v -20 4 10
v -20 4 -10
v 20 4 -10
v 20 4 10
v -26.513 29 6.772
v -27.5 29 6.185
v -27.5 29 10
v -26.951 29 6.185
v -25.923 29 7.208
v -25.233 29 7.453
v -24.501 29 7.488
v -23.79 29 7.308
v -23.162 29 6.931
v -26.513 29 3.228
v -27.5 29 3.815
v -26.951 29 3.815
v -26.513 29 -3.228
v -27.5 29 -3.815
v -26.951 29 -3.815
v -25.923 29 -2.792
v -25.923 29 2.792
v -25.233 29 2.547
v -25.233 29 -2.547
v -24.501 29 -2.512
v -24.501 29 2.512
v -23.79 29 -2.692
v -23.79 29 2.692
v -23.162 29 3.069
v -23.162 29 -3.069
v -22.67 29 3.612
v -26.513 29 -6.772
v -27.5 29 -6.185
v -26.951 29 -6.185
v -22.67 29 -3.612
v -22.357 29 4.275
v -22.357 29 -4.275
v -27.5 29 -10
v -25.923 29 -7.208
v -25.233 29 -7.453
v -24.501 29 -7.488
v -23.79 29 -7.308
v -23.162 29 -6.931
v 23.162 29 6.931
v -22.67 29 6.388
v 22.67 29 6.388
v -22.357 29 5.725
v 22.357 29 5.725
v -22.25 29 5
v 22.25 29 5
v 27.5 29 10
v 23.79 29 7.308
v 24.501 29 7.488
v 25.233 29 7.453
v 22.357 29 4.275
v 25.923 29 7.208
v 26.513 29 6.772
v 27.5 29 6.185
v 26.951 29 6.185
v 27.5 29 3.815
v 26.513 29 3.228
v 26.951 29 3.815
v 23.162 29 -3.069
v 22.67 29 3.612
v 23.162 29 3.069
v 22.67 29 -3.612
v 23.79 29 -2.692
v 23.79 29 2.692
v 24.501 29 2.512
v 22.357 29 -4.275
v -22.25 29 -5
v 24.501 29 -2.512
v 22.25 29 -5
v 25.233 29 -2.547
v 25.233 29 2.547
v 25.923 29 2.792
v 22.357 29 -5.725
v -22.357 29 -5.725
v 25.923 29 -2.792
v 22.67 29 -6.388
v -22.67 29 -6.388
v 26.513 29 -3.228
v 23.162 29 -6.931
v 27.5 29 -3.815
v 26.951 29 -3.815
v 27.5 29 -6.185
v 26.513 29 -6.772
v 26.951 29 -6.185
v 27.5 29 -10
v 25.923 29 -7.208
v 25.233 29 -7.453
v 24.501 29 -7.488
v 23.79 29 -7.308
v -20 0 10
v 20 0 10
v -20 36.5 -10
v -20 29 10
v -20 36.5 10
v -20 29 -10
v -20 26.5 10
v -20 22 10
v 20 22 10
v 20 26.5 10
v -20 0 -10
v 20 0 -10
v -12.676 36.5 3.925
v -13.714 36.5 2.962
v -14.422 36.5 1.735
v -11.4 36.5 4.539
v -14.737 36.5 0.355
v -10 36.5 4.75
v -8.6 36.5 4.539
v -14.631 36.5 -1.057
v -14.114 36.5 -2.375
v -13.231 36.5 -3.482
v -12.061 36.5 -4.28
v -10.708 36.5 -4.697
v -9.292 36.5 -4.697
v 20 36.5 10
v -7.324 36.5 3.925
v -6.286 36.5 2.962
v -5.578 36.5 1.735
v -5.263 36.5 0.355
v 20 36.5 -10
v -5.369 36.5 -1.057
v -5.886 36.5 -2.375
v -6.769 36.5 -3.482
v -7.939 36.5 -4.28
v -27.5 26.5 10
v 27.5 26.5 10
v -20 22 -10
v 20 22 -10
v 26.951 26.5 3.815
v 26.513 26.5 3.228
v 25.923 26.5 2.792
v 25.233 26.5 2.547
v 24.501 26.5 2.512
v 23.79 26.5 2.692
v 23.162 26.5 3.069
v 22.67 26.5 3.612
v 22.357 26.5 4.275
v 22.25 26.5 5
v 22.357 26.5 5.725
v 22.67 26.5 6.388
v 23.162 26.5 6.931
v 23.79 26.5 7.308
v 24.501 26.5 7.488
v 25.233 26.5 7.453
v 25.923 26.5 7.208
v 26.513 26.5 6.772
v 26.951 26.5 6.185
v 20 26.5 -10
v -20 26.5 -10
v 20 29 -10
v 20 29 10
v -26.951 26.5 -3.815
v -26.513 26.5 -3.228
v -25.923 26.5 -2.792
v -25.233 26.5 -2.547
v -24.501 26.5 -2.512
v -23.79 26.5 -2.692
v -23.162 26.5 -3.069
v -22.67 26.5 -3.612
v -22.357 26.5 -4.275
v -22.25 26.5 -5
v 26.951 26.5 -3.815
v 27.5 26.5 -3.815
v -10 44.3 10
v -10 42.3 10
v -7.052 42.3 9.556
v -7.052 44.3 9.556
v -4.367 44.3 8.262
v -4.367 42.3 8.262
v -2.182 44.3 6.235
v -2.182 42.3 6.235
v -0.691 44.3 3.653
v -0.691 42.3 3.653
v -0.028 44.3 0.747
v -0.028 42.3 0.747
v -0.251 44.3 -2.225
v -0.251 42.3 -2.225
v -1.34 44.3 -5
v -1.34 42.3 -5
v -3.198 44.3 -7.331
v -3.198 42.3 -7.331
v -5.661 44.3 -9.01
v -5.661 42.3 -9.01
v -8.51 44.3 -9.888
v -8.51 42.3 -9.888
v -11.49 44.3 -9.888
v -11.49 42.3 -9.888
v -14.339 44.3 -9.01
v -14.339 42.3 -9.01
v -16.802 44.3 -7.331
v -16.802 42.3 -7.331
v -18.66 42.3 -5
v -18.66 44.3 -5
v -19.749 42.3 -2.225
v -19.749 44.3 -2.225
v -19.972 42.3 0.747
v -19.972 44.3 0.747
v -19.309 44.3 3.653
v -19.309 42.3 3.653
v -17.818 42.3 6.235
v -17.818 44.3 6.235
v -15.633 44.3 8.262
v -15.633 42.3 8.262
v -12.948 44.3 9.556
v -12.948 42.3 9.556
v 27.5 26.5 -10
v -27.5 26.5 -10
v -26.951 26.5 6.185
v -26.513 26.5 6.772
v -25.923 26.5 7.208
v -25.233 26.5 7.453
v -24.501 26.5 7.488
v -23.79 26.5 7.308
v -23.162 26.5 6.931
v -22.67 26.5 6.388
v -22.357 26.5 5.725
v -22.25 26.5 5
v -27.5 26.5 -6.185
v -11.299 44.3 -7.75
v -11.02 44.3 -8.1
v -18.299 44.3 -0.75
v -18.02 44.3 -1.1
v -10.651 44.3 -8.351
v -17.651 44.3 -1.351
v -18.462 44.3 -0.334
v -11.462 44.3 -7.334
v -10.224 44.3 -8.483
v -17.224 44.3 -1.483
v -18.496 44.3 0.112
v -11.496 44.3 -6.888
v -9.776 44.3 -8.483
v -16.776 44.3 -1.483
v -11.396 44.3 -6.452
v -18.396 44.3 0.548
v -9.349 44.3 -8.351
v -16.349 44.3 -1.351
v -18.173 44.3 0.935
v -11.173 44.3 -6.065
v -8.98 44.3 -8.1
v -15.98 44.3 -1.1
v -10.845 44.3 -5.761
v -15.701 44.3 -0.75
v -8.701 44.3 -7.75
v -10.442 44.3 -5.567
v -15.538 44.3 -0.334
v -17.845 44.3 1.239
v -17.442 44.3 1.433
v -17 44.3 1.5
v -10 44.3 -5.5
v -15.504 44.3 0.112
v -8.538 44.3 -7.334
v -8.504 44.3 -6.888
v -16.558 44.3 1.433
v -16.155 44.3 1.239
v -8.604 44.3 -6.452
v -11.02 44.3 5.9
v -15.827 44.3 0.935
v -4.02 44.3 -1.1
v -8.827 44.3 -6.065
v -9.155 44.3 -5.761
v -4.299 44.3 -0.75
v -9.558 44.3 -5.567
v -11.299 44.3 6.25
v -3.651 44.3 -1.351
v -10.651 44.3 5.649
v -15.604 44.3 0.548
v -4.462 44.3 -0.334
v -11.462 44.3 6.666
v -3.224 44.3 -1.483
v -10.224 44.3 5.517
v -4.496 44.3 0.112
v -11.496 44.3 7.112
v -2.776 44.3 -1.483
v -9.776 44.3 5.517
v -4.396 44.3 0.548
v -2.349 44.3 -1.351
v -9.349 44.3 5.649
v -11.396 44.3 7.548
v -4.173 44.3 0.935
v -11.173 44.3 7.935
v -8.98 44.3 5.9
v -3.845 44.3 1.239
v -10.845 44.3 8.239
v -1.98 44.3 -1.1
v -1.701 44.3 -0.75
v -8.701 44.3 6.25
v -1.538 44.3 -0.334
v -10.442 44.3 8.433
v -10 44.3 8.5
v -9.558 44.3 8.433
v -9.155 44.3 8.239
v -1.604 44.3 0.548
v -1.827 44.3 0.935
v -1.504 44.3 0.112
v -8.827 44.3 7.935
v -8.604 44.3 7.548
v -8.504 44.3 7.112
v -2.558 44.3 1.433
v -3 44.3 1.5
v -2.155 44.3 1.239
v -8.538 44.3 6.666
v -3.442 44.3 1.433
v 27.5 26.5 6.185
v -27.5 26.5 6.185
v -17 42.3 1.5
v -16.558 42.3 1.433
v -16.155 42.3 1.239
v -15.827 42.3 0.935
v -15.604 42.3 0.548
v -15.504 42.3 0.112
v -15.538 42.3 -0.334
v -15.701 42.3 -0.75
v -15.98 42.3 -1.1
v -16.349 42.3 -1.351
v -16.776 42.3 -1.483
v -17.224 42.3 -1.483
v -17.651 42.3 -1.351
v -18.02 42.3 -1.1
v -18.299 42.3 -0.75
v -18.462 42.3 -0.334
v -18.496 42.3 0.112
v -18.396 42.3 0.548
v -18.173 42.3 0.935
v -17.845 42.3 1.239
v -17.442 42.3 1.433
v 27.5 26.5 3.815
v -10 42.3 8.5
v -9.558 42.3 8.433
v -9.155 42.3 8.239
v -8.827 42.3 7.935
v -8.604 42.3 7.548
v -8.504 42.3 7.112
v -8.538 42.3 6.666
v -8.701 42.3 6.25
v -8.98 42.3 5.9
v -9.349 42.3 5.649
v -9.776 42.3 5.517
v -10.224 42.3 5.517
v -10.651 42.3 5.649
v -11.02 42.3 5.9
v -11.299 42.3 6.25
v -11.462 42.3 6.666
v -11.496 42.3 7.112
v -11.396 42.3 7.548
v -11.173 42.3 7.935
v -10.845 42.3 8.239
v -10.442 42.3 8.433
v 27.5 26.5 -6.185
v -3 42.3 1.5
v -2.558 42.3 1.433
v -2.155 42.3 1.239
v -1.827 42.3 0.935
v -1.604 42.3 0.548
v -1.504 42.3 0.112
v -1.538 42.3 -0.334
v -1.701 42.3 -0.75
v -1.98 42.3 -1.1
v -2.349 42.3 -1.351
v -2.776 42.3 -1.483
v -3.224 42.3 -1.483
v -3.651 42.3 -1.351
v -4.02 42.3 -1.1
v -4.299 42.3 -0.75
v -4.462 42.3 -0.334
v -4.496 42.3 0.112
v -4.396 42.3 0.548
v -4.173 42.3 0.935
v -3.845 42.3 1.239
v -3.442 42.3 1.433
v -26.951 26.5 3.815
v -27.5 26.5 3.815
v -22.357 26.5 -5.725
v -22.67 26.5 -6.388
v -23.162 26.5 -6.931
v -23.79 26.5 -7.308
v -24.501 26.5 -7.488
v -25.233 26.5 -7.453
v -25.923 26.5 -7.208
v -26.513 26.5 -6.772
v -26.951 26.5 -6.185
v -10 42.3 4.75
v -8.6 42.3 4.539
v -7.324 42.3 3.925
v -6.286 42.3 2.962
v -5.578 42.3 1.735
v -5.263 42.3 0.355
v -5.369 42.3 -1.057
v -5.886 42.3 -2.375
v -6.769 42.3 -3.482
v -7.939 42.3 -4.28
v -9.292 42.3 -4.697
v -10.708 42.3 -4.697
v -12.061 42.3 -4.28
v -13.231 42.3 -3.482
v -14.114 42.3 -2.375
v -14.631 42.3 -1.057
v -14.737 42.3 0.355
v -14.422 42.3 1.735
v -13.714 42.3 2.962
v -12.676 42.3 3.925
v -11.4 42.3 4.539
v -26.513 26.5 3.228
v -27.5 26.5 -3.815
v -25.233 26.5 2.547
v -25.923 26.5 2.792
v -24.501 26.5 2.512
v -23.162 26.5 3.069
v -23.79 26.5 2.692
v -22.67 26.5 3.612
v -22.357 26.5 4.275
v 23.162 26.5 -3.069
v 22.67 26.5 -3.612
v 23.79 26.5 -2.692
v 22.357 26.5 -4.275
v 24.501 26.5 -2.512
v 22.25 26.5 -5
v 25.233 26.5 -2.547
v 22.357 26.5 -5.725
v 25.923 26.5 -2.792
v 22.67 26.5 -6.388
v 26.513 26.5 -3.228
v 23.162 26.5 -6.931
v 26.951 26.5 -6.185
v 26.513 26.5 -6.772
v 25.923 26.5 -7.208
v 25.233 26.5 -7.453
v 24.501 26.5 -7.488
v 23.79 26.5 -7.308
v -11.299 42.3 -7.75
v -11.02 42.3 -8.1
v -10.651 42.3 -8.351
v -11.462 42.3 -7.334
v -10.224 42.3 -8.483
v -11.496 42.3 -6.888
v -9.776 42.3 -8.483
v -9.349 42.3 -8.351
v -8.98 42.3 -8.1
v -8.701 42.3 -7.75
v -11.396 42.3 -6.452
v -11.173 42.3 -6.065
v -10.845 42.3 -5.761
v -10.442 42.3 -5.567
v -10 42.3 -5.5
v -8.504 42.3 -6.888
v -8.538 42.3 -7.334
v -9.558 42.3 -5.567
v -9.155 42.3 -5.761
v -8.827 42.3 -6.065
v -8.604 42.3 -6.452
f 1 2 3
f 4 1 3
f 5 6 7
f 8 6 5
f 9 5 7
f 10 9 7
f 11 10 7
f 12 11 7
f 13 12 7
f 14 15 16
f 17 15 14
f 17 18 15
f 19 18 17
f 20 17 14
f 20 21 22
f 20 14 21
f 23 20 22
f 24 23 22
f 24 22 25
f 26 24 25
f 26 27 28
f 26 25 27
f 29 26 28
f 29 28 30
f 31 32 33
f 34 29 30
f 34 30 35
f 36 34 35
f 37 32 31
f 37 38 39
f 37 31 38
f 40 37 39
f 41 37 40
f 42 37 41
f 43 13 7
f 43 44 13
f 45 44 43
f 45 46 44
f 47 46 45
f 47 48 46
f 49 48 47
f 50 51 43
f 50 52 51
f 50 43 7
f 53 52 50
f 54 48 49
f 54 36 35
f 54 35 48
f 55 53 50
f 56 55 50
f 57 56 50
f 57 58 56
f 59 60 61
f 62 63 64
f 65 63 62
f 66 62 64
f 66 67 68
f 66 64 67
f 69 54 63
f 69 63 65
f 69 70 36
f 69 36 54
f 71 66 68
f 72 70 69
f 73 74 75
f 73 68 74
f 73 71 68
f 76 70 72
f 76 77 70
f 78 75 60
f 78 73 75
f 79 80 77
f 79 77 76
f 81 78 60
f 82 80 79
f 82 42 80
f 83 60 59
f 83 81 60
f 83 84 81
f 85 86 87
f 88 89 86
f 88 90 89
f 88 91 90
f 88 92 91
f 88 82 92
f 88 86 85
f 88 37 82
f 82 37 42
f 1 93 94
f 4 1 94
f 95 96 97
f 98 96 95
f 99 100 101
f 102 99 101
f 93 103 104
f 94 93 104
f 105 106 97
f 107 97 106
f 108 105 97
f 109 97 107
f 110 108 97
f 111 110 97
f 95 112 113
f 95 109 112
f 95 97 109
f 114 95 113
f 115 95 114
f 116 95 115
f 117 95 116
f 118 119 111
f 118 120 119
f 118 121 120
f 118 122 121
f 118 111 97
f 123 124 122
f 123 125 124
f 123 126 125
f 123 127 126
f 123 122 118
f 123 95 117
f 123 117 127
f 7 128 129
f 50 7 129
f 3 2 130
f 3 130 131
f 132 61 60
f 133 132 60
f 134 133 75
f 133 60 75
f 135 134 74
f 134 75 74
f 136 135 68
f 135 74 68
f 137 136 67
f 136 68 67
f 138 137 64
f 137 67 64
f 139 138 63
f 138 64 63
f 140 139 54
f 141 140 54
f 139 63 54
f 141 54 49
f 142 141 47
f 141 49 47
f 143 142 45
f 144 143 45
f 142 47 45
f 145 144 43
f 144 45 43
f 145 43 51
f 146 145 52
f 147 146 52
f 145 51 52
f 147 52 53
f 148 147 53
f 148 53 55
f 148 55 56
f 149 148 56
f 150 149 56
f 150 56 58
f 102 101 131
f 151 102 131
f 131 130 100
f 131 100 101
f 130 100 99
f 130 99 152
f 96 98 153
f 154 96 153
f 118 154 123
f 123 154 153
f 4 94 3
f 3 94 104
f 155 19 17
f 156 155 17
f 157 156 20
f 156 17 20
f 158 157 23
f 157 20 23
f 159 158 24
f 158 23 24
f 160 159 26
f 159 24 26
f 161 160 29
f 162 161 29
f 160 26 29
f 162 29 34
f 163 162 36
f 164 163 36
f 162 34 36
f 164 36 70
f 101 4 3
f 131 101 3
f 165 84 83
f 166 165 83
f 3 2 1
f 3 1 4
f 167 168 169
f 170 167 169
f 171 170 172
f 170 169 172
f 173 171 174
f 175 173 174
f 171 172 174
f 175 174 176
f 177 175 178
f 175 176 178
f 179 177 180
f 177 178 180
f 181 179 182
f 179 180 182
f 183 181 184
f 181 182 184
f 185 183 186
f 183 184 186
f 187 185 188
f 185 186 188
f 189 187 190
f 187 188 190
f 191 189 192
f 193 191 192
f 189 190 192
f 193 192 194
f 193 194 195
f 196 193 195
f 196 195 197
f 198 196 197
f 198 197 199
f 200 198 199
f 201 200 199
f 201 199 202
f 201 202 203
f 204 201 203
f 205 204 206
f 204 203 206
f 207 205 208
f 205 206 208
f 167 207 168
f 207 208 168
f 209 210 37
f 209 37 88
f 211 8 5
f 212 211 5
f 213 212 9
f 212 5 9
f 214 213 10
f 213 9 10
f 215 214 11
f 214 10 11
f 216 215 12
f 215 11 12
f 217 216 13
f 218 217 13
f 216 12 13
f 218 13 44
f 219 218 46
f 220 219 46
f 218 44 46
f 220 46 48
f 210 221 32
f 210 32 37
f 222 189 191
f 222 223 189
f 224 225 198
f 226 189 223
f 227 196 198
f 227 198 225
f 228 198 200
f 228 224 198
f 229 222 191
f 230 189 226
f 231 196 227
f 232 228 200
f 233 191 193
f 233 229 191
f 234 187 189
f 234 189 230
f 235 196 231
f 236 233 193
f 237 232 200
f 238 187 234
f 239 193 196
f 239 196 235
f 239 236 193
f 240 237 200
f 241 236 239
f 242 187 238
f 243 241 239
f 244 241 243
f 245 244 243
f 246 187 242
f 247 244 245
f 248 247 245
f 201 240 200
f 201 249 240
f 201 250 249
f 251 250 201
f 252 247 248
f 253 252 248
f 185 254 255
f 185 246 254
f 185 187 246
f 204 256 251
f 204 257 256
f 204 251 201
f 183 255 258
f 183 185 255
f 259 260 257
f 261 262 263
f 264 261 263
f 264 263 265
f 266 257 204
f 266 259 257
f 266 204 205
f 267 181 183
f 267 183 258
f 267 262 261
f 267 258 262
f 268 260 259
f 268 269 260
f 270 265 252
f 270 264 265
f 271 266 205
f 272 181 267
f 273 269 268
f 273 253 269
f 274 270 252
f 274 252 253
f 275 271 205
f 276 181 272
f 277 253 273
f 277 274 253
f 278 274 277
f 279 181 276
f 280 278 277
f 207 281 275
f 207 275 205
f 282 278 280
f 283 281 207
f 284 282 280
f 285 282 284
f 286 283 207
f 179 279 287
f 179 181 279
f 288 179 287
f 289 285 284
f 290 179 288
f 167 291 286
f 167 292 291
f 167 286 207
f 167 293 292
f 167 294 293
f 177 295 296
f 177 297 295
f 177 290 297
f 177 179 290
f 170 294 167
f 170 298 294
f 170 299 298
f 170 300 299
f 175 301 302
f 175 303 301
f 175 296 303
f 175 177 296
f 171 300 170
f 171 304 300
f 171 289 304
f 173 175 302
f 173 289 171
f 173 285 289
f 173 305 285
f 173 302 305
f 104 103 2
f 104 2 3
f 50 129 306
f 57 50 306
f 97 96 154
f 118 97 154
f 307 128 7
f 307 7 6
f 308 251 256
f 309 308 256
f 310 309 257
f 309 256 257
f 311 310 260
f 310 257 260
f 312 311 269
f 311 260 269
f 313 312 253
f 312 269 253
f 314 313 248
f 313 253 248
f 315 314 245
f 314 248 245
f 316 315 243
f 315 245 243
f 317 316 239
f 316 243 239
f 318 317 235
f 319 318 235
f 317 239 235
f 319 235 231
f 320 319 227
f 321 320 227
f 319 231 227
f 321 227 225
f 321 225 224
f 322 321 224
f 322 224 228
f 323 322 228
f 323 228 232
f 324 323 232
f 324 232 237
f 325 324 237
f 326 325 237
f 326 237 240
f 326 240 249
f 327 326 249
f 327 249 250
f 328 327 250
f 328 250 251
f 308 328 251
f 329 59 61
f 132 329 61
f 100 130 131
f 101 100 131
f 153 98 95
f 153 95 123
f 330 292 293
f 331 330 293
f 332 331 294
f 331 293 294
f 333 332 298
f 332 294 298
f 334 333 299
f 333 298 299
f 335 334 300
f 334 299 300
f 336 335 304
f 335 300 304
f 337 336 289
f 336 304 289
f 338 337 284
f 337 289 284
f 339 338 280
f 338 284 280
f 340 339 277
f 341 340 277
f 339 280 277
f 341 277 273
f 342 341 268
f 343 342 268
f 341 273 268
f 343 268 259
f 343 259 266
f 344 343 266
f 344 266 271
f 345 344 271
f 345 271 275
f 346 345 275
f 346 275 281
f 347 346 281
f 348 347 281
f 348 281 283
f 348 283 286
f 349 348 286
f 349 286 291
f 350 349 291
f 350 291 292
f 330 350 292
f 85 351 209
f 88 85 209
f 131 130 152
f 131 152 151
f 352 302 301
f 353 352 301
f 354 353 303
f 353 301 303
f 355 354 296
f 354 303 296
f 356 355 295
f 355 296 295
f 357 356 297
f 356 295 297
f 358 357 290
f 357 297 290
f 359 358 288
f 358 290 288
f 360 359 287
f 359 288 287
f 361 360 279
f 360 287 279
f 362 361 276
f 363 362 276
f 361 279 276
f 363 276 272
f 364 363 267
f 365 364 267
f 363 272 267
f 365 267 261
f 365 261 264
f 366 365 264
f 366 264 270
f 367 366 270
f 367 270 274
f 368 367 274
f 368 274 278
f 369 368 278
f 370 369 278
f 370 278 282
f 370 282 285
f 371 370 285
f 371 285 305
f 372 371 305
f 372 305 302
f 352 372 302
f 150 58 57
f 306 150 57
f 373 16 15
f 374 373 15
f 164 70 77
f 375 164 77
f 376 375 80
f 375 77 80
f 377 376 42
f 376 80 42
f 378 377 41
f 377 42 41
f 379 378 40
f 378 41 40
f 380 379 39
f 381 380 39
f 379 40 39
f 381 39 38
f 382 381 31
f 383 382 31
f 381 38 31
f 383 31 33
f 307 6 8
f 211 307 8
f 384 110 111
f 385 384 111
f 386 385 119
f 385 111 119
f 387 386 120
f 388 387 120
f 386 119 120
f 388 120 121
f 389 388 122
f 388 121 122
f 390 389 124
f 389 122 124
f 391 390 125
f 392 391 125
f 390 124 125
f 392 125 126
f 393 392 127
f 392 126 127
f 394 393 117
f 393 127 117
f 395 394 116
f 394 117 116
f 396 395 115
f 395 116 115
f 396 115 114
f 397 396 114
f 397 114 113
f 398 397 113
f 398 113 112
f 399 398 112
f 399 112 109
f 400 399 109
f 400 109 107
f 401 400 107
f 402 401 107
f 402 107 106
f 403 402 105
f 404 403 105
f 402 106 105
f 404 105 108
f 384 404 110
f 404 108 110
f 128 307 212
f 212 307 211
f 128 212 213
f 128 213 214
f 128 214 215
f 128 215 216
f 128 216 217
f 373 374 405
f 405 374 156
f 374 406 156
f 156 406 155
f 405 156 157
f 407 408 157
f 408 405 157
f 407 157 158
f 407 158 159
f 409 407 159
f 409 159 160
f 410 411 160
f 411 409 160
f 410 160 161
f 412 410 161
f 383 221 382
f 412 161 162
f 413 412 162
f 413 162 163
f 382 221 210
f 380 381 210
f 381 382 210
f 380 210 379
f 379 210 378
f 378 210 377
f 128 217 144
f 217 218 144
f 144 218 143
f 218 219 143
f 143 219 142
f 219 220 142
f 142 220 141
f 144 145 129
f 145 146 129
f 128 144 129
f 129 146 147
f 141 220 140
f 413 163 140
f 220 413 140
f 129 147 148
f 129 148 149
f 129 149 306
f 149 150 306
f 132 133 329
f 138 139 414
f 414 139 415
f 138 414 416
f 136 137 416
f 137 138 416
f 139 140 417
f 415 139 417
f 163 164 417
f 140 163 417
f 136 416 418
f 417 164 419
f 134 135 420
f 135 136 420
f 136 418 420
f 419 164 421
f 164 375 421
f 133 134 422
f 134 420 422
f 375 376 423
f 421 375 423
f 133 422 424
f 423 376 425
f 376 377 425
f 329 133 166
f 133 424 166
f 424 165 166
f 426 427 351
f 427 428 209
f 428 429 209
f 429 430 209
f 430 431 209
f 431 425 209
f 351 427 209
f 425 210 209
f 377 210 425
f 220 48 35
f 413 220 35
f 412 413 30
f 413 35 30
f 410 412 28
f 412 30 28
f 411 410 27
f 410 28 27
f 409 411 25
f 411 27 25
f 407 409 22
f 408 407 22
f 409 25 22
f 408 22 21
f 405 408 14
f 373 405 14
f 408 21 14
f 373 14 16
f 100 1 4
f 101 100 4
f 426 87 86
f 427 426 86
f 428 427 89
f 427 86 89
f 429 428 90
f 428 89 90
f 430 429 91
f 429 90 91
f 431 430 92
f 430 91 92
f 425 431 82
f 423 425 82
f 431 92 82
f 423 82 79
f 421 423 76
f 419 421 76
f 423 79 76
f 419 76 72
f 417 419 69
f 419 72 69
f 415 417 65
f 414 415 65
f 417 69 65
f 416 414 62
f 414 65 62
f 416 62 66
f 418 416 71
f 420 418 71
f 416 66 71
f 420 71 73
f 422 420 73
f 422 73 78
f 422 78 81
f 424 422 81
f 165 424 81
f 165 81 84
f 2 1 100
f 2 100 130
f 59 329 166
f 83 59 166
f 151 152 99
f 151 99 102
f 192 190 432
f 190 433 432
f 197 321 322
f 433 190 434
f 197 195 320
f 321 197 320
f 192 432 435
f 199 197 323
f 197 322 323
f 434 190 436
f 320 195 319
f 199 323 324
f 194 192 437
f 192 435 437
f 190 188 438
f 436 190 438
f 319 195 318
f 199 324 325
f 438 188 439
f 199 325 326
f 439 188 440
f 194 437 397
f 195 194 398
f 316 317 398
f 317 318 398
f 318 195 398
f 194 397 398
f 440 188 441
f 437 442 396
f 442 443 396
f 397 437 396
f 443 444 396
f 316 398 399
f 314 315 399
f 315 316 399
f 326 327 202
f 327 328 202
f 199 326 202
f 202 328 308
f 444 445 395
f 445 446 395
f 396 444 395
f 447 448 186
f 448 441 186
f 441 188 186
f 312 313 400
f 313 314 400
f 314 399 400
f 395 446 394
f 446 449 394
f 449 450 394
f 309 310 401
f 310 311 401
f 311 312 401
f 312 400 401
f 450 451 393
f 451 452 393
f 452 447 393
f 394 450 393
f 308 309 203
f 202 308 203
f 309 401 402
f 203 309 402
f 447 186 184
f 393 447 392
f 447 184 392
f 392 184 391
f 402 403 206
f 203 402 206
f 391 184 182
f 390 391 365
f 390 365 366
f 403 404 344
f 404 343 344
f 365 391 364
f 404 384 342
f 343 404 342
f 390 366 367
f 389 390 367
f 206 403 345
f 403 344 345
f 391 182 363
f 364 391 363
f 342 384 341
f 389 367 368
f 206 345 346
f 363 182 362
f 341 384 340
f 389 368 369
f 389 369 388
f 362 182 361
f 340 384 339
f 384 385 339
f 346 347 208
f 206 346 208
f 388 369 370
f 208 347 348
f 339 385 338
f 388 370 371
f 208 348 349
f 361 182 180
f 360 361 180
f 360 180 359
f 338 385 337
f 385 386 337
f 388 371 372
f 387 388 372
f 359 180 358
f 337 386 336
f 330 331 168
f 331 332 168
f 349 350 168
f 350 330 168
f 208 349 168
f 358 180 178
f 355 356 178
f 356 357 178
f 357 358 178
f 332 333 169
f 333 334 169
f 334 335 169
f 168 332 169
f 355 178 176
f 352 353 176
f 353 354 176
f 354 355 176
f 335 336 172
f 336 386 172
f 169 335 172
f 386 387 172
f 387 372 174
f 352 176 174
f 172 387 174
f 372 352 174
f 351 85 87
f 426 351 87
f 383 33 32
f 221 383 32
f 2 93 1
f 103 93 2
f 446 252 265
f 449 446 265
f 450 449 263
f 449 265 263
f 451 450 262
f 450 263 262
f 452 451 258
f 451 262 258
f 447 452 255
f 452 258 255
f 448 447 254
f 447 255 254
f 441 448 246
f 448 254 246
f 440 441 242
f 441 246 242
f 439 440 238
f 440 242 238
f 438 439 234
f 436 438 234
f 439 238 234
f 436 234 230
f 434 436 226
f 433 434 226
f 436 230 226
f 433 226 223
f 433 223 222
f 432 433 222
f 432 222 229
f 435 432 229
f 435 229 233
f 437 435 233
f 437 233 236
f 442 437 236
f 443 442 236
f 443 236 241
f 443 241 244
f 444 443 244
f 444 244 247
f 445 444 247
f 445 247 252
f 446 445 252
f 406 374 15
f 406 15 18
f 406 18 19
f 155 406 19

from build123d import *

# Parameters (mm, degrees)
SKETCH_1_W          = 40
SKETCH_1_H          = 20
EXTRUDE_1_DEPTH     = 4
SKETCH_2_W          = 40
SKETCH_2_H          = 20
EXTRUDE_2_DEPTH     = 18
SKETCH_3_W          = 40
SKETCH_3_H          = 20
EXTRUDE_3_DEPTH     = 4.5
SKETCH_4_W          = 55
SKETCH_4_H          = 20
EXTRUDE_4_DEPTH     = 2.5
SKETCH_5_W          = 40
SKETCH_5_H          = 20
EXTRUDE_5_DEPTH     = 7.5
CUT_EXTRUDE_2_DEPTH = 47.781406563
SKETCH_7_R          = 4.75
EXTRUDE_6_DEPTH     = 5.8
SKETCH_9_R          = 10
EXTRUDE_7_DEPTH     = 2
SKETCH_10_R         = 2.75
EXTRUDE_8_DEPTH     = 2.5
SKETCH_11_R         = 1.5
CUT_EXTRUDE_3_DEPTH = 2.8
CUT_EXTRUDE_4_DEPTH = 1
SKETCH_13_R         = 2.75
CUT_EXTRUDE_5_DEPTH = 2.5


with BuildPart() as part:
    # 草图1 → 凸台-拉伸1 (new body)
    with BuildSketch(Plane(origin=(0, 0, 0), x_dir=(1, 0, 0), z_dir=(0, 1, 0))):
        Rectangle(SKETCH_1_W, SKETCH_1_H)
    extrude(amount=EXTRUDE_1_DEPTH)


with BuildPart() as body_2:
    # 草图2 → 凸台-拉伸2 (new body)
    with BuildSketch(Plane(origin=(0, 4, 0), x_dir=(1, 0, 0), z_dir=(0, 1, 0))):
        Rectangle(SKETCH_2_W, SKETCH_2_H)
    extrude(amount=EXTRUDE_2_DEPTH)


with BuildPart() as body_3:
    # 草图3 → 凸台-拉伸3 (new body)
    with BuildSketch(Plane(origin=(0, 22, 0), x_dir=(1, 0, 0), z_dir=(0, 1, 0))):
        Rectangle(SKETCH_3_W, SKETCH_3_H)
    extrude(amount=EXTRUDE_3_DEPTH)


with BuildPart() as body_4:
    # 草图4 → 凸台-拉伸4 (new body)
    with BuildSketch(Plane(origin=(0, 26.5, 0), x_dir=(1, 0, 0), z_dir=(0, 1, 0))):
        Rectangle(SKETCH_4_W, SKETCH_4_H)
    extrude(amount=EXTRUDE_4_DEPTH)

    # 草图6 → 切除-拉伸2 (cut, through all)
    with BuildSketch(Plane(origin=(0, 36.5, 0), x_dir=(1, 0, 0), z_dir=(0, 1, 0))):
        with BuildLine():
            ThreePointArc((-22.25, 5), (-24.138968197, 7.424178239), (-26.951312109, 6.185))
            Line((-26.951312109, 6.185), (-24.064754398, 6.185))
            Line((-24.064754398, 6.185), (-24.064754398, 3.815))
            Line((-24.064754398, 3.815), (-26.951312109, 3.815))
            ThreePointArc((-26.951312109, 3.815), (-24.138968197, 2.575821761), (-22.25, 5))
        make_face()
        with BuildLine():
            Line((-24.064754398, 6.185), (-26.951312109, 6.185))
            ThreePointArc((-26.951312109, 6.185), (-27.25, 5), (-26.951312109, 3.815))
            Line((-26.951312109, 3.815), (-24.064754398, 3.815))
            Line((-24.064754398, 3.815), (-24.064754398, 6.185))
        make_face()
        with BuildLine():
            Line((-26.951312109, 6.185), (-28.064754398, 6.185))
            Line((-28.064754398, 6.185), (-28.064754398, 3.815))
            Line((-28.064754398, 3.815), (-26.951312109, 3.815))
            ThreePointArc((-26.951312109, 3.815), (-27.25, 5), (-26.951312109, 6.185))
        make_face()
        with BuildLine():
            ThreePointArc((-22.25, -5), (-24.138968197, -2.575821761), (-26.951312109, -3.815))
            Line((-26.951312109, -3.815), (-24.064754398, -3.815))
            Line((-24.064754398, -3.815), (-24.064754398, -6.185))
            Line((-24.064754398, -6.185), (-26.951312109, -6.185))
            ThreePointArc((-26.951312109, -6.185), (-24.138968197, -7.424178239), (-22.25, -5))
        make_face()
        with BuildLine():
            Line((-24.064754398, -3.815), (-26.951312109, -3.815))
            ThreePointArc((-26.951312109, -3.815), (-27.25, -5), (-26.951312109, -6.185))
            Line((-26.951312109, -6.185), (-24.064754398, -6.185))
            Line((-24.064754398, -6.185), (-24.064754398, -3.815))
        make_face()
        with BuildLine():
            Line((-26.951312109, -3.815), (-28.064754398, -3.815))
            Line((-28.064754398, -3.815), (-28.064754398, -6.185))
            Line((-28.064754398, -6.185), (-26.951312109, -6.185))
            ThreePointArc((-26.951312109, -6.185), (-27.25, -5), (-26.951312109, -3.815))
        make_face()
        with BuildLine():
            ThreePointArc((26.951312109, 6.185), (22.25, 5), (26.951312109, 3.815))
            Line((26.951312109, 3.815), (24.064754398, 3.815))
            Line((24.064754398, 3.815), (24.064754398, 6.185))
            Line((24.064754398, 6.185), (26.951312109, 6.185))
        make_face()
        with BuildLine():
            Line((24.064754398, 3.815), (26.951312109, 3.815))
            ThreePointArc((26.951312109, 3.815), (27.174178239, 4.388968197), (27.25, 5))
            ThreePointArc((27.25, 5), (27.174178239, 5.611031803), (26.951312109, 6.185))
            Line((26.951312109, 6.185), (24.064754398, 6.185))
            Line((24.064754398, 6.185), (24.064754398, 3.815))
        make_face()
        with BuildLine():
            Line((26.951312109, 3.815), (28.064754398, 3.815))
            Line((28.064754398, 3.815), (28.064754398, 6.185))
            Line((28.064754398, 6.185), (26.951312109, 6.185))
            ThreePointArc((26.951312109, 6.185), (27.174178239, 5.611031803), (27.25, 5))
            ThreePointArc((27.25, 5), (27.174178239, 4.388968197), (26.951312109, 3.815))
        make_face()
        with BuildLine():
            ThreePointArc((26.951312109, -3.815), (22.25, -5), (26.951312109, -6.185))
            Line((26.951312109, -6.185), (24.064754398, -6.185))
            Line((24.064754398, -6.185), (24.064754398, -3.815))
            Line((24.064754398, -3.815), (26.951312109, -3.815))
        make_face()
        with BuildLine():
            Line((24.064754398, -6.185), (26.951312109, -6.185))
            ThreePointArc((26.951312109, -6.185), (27.174178239, -5.611031803), (27.25, -5))
            ThreePointArc((27.25, -5), (27.174178239, -4.388968197), (26.951312109, -3.815))
            Line((26.951312109, -3.815), (24.064754398, -3.815))
            Line((24.064754398, -3.815), (24.064754398, -6.185))
        make_face()
        with BuildLine():
            Line((26.951312109, -6.185), (28.064754398, -6.185))
            Line((28.064754398, -6.185), (28.064754398, -3.815))
            Line((28.064754398, -3.815), (26.951312109, -3.815))
            ThreePointArc((26.951312109, -3.815), (27.174178239, -4.388968197), (27.25, -5))
            ThreePointArc((27.25, -5), (27.174178239, -5.611031803), (26.951312109, -6.185))
        make_face()
    extrude(amount=-CUT_EXTRUDE_2_DEPTH, mode=Mode.SUBTRACT)


with BuildPart() as body_5:
    # 草图5 → 凸台-拉伸5 (new body)
    with BuildSketch(Plane(origin=(0, 29, 0), x_dir=(1, 0, 0), z_dir=(0, 1, 0))):
        Rectangle(SKETCH_5_W, SKETCH_5_H)
    extrude(amount=EXTRUDE_5_DEPTH)

    # 草图7 → 凸台-拉伸6 (add)
    with BuildSketch(Plane(origin=(0, 36.5, 0), x_dir=(1, 0, 0), z_dir=(0, 1, 0))):
        with Locations(Location((-10, 0, 0), (0, 0, 270))):
            Circle(SKETCH_7_R)
    extrude(amount=EXTRUDE_6_DEPTH)

    # 草图9 → 凸台-拉伸7 (add)
    with BuildSketch(Plane(origin=(0, 42.3, 0), x_dir=(1, 0, 0), z_dir=(0, 1, 0))):
        with Locations(Location((-10, 0, 0), (0, 0, 270))):
            Circle(SKETCH_9_R)
    extrude(amount=EXTRUDE_7_DEPTH)

    # 草图10 → 凸台-拉伸8 (add)
    with BuildSketch(Plane(origin=(0, 44.3, 0), x_dir=(1, 0, 0), z_dir=(0, 1, 0))):
        with Locations(Location((-10, 0, 0), (0, 0, 270))):
            Circle(SKETCH_10_R)
    extrude(amount=EXTRUDE_8_DEPTH)

    # 草图11 → 切除-拉伸3 (cut)
    with BuildSketch(Plane(origin=(0, 44.3, 0), x_dir=(1, 0, 0), z_dir=(0, 1, 0))):
        with Locations(Location((-10, 7, 0), (0, 0, 270))):
            Circle(SKETCH_11_R)
        with Locations(Location((-17, 0, 0), (0, 0, 270))):
            Circle(SKETCH_11_R)
        with Locations(Location((-10, -7, 0), (0, 0, 270))):
            Circle(SKETCH_11_R)
        with Locations(Location((-3, 0, 0), (0, 0, 270))):
            Circle(SKETCH_11_R)
    extrude(amount=-CUT_EXTRUDE_3_DEPTH, mode=Mode.SUBTRACT)

    # 草图12 → 切除-拉伸4 (cut)
    with BuildSketch(Plane(origin=(0, 46.8, 0), x_dir=(1, 0, 0), z_dir=(0, 1, 0))):
        Polygon((-9.251607711, -1.234197033), (-8.556957872, 0.031028218), (-9.305350161, 1.26522525), (-10.748392289, 1.234197033), (-11.443042128, -0.031028218), (-10.694649839, -1.26522525), align=None)
    extrude(amount=-CUT_EXTRUDE_4_DEPTH, mode=Mode.SUBTRACT)

    # 草图13 → 切除-拉伸5 (cut)
    with BuildSketch(Plane(origin=(0, 46.8, 0), x_dir=(1, 0, 0), z_dir=(0, 1, 0))):
        with Locations((-10, 0)):
            Circle(SKETCH_13_R)
    extrude(amount=-CUT_EXTRUDE_5_DEPTH, mode=Mode.SUBTRACT)


solid = Compound([part.part, body_2.part, body_3.part, body_4.part, body_5.part])
